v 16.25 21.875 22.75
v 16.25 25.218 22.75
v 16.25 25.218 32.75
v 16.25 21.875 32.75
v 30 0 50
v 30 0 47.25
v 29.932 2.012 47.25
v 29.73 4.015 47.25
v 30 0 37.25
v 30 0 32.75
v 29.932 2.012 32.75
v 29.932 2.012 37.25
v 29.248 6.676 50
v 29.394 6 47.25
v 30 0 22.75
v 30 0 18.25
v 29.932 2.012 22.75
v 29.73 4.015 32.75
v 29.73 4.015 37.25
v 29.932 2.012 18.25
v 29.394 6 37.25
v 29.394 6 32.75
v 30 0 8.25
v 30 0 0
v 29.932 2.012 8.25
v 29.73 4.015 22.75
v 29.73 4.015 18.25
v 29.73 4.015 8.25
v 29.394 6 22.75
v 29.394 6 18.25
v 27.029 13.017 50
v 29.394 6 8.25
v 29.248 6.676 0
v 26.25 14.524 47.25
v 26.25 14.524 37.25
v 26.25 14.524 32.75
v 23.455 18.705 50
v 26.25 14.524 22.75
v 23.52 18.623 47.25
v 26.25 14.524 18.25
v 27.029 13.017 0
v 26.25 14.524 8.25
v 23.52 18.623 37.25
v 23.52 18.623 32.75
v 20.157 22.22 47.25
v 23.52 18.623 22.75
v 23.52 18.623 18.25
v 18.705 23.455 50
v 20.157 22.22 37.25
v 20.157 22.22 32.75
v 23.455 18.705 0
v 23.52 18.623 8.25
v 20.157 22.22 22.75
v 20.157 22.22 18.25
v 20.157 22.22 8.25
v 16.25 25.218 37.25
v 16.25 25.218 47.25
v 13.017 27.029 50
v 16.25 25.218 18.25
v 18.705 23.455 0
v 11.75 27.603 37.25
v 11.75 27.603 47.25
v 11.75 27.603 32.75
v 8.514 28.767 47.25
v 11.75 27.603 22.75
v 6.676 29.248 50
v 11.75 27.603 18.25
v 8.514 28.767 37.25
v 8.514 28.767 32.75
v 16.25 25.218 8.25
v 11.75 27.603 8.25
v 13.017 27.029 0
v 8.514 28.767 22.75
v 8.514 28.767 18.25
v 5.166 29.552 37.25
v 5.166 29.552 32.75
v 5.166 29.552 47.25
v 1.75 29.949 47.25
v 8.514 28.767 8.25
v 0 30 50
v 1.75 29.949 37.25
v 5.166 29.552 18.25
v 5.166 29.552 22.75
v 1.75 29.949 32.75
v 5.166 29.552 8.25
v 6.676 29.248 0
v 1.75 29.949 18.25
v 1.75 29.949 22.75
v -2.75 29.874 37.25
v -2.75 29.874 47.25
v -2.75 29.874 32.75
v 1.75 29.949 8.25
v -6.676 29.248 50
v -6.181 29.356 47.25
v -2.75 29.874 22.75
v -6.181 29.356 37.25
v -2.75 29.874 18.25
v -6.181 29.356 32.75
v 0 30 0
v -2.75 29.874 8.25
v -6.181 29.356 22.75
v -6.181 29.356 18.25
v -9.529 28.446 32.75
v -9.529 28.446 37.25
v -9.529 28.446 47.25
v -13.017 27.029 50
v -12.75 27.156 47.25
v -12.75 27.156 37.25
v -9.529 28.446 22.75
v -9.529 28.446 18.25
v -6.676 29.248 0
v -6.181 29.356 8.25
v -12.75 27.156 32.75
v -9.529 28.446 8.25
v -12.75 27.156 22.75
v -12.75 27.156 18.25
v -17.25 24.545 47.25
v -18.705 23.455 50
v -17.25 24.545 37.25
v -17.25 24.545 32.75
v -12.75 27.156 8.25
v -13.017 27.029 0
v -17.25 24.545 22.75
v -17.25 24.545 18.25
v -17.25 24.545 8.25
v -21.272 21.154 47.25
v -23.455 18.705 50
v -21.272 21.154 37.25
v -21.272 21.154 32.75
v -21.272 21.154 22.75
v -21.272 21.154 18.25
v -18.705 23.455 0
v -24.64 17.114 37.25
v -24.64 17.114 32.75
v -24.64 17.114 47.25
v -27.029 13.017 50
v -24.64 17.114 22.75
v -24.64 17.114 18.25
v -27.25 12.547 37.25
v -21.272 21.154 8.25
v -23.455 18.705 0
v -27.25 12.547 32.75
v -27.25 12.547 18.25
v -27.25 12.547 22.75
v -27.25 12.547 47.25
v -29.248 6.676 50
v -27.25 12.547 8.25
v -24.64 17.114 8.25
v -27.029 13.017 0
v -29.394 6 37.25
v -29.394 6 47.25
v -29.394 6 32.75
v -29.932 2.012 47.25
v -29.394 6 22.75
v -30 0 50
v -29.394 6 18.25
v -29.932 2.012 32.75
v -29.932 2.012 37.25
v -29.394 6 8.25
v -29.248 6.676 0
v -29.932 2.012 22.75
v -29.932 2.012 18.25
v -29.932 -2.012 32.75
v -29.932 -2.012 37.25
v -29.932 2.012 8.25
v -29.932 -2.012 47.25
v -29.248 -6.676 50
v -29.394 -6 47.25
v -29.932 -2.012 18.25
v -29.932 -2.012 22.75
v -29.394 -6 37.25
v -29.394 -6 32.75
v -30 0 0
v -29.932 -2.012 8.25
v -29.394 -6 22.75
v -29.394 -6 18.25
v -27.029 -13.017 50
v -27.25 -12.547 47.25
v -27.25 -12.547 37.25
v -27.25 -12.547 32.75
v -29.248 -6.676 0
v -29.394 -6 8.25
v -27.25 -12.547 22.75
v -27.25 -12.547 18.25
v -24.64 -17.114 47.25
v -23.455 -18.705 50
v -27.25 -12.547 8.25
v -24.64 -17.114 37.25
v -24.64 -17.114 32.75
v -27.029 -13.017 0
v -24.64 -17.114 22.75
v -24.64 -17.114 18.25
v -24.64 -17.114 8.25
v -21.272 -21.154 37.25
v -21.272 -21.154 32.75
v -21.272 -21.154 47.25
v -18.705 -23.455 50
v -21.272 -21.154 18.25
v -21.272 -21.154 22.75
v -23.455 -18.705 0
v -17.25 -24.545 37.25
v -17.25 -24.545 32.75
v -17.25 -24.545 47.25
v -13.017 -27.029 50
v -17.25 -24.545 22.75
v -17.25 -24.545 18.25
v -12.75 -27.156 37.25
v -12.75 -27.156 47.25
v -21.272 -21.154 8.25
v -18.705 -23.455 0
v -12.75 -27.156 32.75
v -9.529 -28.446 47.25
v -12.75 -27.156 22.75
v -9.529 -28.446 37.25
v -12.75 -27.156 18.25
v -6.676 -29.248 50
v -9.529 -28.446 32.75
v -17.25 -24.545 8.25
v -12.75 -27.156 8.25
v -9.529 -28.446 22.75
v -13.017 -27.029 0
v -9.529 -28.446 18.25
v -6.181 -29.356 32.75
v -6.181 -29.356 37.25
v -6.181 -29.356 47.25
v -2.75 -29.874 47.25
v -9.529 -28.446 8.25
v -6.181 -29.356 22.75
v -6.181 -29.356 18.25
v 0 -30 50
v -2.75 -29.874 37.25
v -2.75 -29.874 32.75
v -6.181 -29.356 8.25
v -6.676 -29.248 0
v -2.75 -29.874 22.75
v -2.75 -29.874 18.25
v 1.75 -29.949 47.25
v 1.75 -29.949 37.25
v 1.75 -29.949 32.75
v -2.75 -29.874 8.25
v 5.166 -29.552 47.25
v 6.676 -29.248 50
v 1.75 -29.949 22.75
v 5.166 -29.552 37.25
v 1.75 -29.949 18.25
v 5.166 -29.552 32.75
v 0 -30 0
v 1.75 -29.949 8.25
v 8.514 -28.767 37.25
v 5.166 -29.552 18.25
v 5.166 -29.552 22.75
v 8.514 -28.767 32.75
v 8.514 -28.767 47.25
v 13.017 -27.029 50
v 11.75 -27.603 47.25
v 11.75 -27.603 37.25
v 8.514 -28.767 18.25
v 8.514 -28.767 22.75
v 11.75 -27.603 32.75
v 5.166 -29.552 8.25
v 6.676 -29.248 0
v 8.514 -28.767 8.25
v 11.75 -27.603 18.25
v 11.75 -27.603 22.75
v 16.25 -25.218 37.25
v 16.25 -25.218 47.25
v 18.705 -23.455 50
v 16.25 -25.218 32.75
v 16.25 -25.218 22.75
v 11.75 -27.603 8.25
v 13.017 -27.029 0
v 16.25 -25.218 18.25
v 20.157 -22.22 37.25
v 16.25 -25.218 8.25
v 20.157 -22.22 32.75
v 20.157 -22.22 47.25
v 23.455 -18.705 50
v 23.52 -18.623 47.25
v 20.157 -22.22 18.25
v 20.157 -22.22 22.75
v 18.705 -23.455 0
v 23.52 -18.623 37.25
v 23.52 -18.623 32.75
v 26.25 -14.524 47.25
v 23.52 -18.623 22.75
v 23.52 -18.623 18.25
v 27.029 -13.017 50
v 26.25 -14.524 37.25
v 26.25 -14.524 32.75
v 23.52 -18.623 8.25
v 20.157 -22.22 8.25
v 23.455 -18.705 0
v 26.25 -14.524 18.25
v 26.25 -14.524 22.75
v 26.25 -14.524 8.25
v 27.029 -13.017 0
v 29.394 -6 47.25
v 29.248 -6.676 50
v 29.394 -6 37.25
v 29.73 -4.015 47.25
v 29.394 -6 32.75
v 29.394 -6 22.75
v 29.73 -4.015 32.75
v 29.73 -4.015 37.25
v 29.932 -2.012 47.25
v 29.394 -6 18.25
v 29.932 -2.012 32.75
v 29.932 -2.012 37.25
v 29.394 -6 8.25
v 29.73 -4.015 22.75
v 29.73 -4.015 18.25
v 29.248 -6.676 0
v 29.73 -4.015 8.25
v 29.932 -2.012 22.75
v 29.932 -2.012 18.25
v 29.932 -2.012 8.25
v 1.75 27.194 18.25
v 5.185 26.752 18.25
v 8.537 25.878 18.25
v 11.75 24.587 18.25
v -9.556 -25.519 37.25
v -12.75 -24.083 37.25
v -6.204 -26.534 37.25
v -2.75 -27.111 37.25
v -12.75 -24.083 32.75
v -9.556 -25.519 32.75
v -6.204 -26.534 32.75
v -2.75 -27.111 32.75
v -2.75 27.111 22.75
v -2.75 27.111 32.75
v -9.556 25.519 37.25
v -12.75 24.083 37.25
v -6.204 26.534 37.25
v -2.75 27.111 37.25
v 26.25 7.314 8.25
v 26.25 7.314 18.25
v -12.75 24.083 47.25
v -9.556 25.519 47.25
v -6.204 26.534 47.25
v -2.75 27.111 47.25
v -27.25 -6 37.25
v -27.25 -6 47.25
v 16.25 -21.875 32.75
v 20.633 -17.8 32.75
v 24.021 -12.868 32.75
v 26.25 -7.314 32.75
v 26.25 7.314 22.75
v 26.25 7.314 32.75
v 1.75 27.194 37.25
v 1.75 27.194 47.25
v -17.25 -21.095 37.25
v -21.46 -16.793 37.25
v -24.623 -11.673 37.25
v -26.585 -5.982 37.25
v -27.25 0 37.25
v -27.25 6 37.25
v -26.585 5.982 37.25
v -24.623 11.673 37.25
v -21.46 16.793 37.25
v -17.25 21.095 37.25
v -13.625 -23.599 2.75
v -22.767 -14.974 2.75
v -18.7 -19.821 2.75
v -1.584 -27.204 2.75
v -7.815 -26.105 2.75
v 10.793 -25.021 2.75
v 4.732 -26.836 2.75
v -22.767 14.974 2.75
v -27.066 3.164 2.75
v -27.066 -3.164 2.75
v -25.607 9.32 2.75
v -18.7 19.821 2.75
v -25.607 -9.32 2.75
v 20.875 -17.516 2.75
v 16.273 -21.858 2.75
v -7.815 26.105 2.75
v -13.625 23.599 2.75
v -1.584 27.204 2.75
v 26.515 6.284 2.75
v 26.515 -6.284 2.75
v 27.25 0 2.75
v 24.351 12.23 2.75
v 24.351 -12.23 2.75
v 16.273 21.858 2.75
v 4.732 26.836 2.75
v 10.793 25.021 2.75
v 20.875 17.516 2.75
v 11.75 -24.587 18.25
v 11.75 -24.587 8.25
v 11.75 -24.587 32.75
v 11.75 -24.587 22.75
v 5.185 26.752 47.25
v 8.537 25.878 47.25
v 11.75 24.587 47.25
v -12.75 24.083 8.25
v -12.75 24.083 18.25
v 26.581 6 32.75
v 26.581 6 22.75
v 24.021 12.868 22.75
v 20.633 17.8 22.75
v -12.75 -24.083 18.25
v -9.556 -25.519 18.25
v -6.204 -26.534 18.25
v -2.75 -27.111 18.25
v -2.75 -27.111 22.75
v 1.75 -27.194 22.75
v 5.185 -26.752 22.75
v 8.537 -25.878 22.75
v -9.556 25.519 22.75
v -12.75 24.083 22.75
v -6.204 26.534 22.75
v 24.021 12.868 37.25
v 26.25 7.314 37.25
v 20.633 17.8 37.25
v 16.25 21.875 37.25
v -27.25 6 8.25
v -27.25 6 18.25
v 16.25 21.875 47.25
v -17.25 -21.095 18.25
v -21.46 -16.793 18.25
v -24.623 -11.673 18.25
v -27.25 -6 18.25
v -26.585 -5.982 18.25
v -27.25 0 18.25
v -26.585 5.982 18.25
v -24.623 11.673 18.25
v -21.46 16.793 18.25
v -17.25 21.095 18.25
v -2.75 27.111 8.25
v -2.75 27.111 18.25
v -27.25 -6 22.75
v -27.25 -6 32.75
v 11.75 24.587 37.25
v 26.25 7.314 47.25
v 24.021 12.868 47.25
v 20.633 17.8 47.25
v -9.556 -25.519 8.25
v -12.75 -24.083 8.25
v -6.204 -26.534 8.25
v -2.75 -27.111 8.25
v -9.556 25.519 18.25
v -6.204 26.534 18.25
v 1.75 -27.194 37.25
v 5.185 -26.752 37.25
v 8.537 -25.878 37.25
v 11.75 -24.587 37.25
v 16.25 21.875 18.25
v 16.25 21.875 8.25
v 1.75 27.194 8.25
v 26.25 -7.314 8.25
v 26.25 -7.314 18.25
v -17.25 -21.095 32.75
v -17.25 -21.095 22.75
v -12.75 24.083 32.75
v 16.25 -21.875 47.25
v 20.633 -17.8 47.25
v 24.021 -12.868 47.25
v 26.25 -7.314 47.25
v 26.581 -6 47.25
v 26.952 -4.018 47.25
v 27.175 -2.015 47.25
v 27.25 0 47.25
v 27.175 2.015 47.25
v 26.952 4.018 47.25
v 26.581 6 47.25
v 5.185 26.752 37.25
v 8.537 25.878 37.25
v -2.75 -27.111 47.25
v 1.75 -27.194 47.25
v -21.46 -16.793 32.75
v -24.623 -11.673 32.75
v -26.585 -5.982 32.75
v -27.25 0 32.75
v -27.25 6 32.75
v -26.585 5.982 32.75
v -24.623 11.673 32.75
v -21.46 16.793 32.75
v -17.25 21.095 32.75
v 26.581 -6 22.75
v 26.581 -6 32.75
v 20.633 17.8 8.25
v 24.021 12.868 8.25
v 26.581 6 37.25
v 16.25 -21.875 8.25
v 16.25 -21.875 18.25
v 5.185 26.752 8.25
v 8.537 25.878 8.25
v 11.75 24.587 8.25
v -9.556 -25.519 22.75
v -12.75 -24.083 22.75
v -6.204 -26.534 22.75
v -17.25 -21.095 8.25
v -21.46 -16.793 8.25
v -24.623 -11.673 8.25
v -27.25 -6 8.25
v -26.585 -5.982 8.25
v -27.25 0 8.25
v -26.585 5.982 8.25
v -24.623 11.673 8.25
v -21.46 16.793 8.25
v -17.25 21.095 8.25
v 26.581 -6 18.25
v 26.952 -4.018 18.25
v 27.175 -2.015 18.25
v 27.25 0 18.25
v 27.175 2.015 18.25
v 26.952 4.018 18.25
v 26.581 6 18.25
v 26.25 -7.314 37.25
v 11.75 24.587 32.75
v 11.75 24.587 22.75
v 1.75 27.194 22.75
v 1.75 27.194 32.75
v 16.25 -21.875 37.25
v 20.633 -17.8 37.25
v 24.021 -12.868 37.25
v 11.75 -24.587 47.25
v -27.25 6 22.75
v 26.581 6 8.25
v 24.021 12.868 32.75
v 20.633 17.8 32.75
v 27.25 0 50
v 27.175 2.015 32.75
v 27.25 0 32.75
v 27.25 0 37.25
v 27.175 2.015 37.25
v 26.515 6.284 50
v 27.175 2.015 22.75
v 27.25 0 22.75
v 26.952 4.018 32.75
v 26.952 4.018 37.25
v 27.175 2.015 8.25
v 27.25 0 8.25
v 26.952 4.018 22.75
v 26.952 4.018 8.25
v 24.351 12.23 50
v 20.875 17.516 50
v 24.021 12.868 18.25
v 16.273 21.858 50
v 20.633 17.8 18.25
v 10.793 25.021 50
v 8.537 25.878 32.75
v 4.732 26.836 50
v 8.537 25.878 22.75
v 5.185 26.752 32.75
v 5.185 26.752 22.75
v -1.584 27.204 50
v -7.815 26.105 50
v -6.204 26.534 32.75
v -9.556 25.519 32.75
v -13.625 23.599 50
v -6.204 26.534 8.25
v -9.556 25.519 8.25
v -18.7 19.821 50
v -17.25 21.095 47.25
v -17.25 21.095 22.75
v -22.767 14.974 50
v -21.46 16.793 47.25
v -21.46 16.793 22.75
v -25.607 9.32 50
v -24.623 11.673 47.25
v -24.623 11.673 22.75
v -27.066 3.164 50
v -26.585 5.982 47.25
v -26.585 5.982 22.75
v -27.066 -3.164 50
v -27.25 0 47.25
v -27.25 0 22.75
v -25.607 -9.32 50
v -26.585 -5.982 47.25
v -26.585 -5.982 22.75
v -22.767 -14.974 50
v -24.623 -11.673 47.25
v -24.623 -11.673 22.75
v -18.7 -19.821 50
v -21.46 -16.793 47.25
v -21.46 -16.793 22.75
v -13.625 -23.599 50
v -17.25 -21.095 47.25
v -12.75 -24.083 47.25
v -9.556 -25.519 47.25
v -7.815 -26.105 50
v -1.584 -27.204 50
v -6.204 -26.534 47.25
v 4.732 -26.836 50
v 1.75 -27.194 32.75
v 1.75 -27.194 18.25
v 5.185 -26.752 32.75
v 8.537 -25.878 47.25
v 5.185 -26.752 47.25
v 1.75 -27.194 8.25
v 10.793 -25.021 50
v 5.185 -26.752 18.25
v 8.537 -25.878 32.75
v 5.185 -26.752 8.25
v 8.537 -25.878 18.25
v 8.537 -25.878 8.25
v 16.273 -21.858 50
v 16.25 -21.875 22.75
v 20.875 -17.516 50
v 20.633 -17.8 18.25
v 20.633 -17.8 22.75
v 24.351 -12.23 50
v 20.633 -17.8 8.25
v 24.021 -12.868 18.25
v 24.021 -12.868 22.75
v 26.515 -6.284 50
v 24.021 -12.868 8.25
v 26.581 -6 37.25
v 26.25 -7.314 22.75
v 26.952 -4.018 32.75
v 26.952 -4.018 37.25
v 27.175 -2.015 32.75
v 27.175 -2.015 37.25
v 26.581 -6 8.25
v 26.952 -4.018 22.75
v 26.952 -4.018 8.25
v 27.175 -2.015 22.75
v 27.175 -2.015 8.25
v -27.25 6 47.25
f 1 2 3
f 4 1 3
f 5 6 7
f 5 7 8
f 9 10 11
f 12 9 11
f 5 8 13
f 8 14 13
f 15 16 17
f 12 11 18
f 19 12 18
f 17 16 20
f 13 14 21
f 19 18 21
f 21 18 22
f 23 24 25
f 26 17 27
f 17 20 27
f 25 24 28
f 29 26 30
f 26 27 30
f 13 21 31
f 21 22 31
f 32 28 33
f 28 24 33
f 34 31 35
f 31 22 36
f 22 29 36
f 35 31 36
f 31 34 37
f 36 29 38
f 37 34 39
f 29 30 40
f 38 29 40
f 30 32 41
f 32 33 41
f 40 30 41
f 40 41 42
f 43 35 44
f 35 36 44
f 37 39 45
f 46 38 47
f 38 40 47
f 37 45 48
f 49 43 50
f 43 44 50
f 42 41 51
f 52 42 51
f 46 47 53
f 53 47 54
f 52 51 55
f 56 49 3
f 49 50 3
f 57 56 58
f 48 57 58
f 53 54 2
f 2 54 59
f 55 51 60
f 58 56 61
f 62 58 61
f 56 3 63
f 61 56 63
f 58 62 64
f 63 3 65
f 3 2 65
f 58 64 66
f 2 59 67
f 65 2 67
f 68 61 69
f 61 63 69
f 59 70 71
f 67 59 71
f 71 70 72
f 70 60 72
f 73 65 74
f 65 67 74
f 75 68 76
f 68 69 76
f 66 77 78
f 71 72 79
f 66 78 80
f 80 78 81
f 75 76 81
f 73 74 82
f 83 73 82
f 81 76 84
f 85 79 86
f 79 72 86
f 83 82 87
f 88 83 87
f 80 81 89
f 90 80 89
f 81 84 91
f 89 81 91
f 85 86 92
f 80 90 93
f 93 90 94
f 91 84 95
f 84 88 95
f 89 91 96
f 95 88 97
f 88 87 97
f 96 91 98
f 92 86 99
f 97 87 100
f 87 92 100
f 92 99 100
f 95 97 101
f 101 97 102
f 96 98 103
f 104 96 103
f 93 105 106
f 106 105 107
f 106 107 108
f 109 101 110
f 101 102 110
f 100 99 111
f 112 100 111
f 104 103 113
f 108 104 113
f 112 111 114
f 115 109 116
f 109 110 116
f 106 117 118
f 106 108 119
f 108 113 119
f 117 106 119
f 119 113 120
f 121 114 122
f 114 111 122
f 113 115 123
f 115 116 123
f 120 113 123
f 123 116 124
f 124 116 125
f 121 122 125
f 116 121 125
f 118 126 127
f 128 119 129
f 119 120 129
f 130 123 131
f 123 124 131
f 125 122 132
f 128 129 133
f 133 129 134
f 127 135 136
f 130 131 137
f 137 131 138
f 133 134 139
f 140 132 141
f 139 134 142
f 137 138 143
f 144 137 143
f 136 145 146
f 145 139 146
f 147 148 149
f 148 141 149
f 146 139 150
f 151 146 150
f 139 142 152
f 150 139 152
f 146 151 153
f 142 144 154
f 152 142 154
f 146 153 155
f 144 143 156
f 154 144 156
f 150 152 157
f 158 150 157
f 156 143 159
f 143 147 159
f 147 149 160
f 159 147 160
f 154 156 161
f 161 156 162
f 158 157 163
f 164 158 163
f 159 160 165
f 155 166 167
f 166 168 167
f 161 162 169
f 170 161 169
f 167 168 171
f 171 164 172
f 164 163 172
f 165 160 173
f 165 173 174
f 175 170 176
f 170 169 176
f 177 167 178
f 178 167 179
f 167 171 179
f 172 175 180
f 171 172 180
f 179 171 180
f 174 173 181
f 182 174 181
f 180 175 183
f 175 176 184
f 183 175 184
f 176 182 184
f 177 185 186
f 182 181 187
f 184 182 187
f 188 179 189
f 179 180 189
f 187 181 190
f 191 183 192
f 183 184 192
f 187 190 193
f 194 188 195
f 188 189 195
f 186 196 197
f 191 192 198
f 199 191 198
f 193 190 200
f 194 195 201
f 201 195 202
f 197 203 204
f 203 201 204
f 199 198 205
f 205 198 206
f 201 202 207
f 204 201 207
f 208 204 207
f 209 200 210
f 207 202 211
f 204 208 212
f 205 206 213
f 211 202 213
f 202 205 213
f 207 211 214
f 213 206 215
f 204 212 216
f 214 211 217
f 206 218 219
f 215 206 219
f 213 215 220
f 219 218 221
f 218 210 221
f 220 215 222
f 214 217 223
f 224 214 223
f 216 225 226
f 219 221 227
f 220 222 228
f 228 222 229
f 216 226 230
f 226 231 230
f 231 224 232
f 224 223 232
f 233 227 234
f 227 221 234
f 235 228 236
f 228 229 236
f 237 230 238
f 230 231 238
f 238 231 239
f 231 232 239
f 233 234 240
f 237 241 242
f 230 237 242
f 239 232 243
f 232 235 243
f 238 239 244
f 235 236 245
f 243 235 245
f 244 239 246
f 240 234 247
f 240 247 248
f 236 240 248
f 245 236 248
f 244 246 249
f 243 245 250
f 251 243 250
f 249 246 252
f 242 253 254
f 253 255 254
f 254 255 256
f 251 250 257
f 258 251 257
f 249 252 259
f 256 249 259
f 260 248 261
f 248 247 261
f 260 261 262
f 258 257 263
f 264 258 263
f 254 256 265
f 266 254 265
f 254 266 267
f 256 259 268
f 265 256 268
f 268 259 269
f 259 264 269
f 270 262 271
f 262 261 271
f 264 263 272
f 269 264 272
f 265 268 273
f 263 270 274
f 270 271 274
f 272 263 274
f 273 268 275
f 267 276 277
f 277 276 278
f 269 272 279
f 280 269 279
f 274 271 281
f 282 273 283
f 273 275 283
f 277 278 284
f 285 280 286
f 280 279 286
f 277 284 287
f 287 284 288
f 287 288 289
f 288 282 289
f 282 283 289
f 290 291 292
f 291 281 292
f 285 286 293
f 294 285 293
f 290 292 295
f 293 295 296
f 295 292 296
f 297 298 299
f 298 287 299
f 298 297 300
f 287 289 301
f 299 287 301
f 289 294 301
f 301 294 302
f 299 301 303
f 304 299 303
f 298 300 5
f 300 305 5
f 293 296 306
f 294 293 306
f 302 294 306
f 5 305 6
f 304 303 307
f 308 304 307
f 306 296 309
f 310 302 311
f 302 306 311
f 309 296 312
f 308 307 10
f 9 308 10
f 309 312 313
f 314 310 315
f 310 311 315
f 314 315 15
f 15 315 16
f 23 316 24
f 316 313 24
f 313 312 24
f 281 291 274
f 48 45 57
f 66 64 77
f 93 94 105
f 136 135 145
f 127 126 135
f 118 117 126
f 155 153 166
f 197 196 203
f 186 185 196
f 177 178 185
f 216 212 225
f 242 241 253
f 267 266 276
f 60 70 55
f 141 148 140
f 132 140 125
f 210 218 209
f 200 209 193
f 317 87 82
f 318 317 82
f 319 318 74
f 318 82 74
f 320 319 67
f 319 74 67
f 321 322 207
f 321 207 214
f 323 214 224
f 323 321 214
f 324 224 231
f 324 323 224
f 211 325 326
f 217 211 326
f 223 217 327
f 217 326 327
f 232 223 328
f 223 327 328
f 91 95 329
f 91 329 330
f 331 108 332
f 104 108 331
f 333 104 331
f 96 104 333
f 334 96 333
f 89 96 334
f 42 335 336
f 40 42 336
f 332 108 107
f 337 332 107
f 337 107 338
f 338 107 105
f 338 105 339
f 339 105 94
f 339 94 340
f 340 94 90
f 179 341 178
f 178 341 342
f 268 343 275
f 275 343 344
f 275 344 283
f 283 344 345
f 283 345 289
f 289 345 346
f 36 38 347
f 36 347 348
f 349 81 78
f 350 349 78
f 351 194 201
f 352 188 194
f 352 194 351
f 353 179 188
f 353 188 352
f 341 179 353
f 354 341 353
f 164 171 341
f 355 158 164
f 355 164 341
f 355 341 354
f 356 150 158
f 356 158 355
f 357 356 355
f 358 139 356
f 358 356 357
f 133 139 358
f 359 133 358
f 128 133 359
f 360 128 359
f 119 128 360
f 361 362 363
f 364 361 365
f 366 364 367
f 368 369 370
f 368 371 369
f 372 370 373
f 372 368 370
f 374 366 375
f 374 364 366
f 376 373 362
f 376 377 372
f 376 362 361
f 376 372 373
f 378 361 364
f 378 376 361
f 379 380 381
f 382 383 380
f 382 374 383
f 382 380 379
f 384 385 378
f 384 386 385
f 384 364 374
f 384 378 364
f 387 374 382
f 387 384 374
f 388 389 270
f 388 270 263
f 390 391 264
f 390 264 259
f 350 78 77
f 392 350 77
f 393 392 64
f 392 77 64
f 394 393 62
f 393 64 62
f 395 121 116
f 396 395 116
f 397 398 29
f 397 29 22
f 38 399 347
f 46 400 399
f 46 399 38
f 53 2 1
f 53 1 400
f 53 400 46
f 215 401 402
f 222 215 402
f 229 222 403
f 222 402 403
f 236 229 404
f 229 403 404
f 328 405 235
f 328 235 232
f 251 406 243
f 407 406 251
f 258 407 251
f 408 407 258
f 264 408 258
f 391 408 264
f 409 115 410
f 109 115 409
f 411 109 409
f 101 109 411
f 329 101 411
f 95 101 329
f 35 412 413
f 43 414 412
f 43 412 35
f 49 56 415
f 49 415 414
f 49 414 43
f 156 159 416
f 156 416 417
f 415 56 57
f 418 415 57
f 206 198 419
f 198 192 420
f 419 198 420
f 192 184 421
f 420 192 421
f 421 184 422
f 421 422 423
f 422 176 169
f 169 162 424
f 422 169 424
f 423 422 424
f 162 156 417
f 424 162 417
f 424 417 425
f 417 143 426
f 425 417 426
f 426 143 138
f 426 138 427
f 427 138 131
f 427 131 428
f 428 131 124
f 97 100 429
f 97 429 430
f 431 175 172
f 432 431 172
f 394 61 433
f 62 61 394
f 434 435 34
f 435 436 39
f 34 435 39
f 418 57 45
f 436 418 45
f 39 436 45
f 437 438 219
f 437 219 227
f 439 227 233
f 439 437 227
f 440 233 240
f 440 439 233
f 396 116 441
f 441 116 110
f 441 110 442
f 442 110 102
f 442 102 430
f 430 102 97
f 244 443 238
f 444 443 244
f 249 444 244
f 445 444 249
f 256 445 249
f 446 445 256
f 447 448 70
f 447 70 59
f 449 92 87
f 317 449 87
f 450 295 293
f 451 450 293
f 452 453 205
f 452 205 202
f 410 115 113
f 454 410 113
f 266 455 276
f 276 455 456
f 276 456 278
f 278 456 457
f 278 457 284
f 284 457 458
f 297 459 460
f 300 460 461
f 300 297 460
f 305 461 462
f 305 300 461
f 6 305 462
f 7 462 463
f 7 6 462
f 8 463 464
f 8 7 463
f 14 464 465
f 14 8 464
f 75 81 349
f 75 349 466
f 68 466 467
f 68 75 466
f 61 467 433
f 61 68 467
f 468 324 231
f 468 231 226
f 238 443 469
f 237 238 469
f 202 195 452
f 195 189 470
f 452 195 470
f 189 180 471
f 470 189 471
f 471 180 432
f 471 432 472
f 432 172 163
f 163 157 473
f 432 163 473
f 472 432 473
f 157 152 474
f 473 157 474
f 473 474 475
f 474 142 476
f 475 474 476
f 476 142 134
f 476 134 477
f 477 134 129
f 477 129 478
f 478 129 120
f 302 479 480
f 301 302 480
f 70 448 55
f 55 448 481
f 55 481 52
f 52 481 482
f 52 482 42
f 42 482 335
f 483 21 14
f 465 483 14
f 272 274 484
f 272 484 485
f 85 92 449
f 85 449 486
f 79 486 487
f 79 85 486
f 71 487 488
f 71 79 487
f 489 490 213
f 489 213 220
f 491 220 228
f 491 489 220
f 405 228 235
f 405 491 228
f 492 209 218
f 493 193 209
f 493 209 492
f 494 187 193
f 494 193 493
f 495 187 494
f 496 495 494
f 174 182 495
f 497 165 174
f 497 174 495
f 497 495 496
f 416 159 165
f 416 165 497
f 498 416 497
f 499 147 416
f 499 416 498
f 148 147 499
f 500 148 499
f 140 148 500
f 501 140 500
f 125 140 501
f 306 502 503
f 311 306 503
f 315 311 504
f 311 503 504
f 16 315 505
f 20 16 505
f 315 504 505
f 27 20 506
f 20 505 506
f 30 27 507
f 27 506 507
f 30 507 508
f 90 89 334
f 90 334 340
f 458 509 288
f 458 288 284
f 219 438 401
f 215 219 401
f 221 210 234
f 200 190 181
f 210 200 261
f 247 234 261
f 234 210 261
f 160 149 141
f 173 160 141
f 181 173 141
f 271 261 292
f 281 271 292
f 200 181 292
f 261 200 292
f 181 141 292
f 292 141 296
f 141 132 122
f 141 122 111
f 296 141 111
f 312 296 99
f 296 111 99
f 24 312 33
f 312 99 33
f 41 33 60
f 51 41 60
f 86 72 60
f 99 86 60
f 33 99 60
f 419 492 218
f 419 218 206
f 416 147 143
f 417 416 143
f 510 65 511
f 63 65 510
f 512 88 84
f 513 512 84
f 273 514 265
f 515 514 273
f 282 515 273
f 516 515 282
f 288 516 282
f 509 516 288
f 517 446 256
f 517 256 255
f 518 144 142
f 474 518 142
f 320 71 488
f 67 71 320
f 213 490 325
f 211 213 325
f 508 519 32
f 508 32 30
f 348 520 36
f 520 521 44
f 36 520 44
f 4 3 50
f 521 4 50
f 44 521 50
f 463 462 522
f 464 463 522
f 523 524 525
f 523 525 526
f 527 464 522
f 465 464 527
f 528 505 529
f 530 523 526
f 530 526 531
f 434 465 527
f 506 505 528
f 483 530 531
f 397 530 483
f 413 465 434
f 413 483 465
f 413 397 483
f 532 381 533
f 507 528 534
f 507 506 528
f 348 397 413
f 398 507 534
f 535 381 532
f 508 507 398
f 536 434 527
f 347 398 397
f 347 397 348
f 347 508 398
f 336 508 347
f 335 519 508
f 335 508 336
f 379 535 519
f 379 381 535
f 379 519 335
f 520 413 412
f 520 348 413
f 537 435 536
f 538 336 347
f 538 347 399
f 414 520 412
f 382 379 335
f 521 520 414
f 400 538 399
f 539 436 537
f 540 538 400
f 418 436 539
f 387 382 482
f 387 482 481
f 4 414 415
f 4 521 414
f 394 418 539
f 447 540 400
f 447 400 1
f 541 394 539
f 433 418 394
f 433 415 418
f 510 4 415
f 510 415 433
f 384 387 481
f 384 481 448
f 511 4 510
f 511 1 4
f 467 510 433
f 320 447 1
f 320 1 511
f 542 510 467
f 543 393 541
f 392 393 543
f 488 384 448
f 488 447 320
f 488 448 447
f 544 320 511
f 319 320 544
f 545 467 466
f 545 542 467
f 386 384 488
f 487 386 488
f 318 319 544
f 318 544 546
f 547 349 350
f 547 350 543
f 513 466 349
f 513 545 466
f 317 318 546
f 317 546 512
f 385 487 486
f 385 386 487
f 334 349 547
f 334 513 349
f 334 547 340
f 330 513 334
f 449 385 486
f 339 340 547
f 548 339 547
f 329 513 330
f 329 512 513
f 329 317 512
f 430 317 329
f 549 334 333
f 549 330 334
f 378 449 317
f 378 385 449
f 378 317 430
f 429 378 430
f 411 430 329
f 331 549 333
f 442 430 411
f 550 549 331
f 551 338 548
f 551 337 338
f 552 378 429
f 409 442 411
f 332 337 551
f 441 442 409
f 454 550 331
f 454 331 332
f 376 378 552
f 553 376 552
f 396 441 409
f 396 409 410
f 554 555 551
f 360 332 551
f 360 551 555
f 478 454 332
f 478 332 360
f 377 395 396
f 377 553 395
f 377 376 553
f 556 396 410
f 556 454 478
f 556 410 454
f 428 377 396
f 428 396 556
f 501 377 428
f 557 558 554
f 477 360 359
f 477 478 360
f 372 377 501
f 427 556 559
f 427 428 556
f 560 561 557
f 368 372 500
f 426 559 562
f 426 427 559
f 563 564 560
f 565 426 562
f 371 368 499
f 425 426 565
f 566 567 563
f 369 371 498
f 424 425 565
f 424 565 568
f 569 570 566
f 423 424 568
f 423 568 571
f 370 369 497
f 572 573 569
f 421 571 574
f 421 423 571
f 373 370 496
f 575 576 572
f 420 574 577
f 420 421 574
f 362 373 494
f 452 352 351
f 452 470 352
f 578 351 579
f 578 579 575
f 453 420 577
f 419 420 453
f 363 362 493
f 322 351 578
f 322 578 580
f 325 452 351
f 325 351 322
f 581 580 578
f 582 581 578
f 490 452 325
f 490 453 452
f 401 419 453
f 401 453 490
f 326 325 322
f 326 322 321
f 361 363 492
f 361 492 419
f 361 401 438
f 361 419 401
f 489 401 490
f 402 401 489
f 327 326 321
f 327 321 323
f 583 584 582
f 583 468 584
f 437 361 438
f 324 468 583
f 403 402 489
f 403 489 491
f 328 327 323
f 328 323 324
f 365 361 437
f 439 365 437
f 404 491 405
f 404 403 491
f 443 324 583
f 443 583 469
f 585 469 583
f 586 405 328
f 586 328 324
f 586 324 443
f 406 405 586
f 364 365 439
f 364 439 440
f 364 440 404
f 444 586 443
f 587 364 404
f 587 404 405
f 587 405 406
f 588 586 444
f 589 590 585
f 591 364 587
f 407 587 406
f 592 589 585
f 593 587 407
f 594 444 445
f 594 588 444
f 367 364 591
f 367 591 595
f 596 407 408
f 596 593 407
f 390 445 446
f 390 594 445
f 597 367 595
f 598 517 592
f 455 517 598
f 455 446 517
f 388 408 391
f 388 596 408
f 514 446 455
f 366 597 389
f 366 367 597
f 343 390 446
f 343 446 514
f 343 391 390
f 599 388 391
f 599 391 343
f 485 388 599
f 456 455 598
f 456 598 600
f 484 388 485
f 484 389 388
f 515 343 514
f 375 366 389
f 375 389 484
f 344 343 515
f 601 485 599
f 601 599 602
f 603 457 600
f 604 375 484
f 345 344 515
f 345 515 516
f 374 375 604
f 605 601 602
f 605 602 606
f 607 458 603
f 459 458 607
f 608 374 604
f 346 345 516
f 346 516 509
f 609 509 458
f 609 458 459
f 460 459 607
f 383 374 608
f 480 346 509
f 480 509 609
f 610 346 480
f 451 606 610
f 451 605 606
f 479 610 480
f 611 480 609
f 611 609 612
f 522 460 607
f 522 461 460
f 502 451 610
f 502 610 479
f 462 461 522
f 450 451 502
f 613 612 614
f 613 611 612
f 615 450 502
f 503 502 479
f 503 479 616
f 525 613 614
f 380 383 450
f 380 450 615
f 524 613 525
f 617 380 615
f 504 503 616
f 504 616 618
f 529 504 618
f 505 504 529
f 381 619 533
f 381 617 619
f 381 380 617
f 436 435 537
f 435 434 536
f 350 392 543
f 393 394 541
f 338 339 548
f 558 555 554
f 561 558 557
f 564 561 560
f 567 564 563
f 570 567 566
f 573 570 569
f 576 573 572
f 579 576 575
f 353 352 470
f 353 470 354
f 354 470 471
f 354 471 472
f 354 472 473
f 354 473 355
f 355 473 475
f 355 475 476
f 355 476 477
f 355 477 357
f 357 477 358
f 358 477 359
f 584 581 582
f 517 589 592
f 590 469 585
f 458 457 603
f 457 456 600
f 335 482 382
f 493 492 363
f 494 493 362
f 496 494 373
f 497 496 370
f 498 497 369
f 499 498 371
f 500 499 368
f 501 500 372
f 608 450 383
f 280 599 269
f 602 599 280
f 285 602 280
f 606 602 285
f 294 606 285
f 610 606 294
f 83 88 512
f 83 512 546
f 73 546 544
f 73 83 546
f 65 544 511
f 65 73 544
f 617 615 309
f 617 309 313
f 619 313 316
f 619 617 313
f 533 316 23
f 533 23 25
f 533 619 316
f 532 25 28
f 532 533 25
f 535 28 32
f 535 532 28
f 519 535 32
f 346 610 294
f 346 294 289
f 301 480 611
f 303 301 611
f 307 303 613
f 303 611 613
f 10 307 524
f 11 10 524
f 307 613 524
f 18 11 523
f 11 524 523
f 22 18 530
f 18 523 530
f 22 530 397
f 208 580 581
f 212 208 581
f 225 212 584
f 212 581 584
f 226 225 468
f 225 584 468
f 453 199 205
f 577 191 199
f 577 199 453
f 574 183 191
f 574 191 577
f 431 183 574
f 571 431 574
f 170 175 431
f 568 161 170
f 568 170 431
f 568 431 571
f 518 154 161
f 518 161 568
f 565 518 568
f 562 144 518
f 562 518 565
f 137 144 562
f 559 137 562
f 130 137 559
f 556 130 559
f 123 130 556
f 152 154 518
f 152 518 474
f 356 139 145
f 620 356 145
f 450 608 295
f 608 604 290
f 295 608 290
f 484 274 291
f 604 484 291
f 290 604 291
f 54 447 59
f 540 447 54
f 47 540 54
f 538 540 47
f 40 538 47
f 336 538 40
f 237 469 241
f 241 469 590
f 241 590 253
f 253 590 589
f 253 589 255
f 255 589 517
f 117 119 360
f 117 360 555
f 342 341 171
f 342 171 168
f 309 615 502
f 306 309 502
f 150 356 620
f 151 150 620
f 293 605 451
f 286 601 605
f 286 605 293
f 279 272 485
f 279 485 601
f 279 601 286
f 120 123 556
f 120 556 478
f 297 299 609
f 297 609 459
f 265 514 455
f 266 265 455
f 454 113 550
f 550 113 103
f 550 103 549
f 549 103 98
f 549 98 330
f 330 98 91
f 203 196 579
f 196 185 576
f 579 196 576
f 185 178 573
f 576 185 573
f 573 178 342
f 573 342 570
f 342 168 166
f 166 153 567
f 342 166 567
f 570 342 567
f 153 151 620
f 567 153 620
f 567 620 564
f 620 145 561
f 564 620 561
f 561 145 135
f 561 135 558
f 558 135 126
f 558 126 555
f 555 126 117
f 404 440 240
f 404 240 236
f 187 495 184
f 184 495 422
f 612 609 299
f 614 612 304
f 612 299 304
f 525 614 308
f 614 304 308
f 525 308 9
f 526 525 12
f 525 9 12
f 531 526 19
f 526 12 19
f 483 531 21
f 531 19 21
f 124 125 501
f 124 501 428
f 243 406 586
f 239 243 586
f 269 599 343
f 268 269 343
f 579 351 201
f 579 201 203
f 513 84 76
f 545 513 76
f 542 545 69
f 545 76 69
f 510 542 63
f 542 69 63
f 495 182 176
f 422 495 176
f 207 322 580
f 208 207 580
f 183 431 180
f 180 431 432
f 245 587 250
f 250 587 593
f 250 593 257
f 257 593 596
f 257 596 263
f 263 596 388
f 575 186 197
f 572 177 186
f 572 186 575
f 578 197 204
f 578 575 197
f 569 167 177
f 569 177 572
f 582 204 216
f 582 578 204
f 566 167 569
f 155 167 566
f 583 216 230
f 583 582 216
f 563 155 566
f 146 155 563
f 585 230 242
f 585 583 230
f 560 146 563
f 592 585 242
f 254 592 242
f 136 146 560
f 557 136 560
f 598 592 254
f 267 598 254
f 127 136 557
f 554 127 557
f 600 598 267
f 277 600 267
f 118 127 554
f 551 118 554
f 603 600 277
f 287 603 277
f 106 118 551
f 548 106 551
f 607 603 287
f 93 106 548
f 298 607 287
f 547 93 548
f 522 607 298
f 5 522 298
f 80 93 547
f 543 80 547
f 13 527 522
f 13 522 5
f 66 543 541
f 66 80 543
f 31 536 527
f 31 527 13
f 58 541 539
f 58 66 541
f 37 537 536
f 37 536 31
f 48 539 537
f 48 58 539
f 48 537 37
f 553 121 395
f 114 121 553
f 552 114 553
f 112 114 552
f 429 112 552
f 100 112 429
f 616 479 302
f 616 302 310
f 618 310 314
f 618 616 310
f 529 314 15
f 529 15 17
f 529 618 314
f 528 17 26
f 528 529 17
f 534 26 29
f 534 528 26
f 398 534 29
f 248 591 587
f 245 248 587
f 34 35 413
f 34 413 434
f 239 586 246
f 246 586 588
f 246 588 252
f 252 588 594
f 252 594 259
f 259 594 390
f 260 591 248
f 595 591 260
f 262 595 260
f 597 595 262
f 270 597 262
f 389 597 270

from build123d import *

# Parameters (mm, degrees)
F0_R     = 30
F1_DEPTH = 50
F2_T     = -2.75
F3_W     = 10
F3_H     = 10
F4_DEPTH = 30
F5_W     = 12
F5_H     = 10
F6_DEPTH = 50


with BuildPart() as f1:
    # F0 (on Top) → F1 (new body)
    with BuildSketch(Plane.XY):
        Circle(F0_R)
    extrude(amount=F1_DEPTH)

    # F2
    f2_openings = [f1.faces().sort_by_distance(p)[0] for p in [
        (0, 0, 50),
    ]]
    offset(amount=F2_T, openings=f2_openings)

    # F3 (on Front) → F4 (cut, symmetric)
    with BuildSketch(Plane.XZ):
        with Locations((-22.25, 42.25)):
            Rectangle(F3_W, F3_H)
        with Locations((-22.25, 27.75)):
            Rectangle(F3_W, F3_H)
        with Locations((-22.25, 13.25)):
            Rectangle(F3_W, F3_H)
        with Locations((-7.75, 42.25)):
            Rectangle(F3_W, F3_H)
        with Locations((-7.75, 27.75)):
            Rectangle(F3_W, F3_H)
        with Locations((-7.75, 13.25)):
            Rectangle(F3_W, F3_H)
        with Locations((6.75, 42.25)):
            Rectangle(F3_W, F3_H)
        with Locations((6.75, 27.75)):
            Rectangle(F3_W, F3_H)
        with Locations((6.75, 13.25)):
            Rectangle(F3_W, F3_H)
        with Locations((21.25, 42.25)):
            Rectangle(F3_W, F3_H)
        with Locations((21.25, 27.75)):
            Rectangle(F3_W, F3_H)
        with Locations((21.25, 13.25)):
            Rectangle(F3_W, F3_H)
    extrude(amount=F4_DEPTH, both=True, mode=Mode.SUBTRACT)

    # F5 (on Right) → F6 (cut, symmetric)
    with BuildSketch(Plane.YZ):
        with Locations((0, 13.25)):
            Rectangle(F5_W, F5_H)
        with Locations((0, 27.75)):
            Rectangle(F5_W, F5_H)
        with Locations((0, 42.25)):
            Rectangle(F5_W, F5_H)
    extrude(amount=F6_DEPTH, both=True, mode=Mode.SUBTRACT)


solid = f1.part
